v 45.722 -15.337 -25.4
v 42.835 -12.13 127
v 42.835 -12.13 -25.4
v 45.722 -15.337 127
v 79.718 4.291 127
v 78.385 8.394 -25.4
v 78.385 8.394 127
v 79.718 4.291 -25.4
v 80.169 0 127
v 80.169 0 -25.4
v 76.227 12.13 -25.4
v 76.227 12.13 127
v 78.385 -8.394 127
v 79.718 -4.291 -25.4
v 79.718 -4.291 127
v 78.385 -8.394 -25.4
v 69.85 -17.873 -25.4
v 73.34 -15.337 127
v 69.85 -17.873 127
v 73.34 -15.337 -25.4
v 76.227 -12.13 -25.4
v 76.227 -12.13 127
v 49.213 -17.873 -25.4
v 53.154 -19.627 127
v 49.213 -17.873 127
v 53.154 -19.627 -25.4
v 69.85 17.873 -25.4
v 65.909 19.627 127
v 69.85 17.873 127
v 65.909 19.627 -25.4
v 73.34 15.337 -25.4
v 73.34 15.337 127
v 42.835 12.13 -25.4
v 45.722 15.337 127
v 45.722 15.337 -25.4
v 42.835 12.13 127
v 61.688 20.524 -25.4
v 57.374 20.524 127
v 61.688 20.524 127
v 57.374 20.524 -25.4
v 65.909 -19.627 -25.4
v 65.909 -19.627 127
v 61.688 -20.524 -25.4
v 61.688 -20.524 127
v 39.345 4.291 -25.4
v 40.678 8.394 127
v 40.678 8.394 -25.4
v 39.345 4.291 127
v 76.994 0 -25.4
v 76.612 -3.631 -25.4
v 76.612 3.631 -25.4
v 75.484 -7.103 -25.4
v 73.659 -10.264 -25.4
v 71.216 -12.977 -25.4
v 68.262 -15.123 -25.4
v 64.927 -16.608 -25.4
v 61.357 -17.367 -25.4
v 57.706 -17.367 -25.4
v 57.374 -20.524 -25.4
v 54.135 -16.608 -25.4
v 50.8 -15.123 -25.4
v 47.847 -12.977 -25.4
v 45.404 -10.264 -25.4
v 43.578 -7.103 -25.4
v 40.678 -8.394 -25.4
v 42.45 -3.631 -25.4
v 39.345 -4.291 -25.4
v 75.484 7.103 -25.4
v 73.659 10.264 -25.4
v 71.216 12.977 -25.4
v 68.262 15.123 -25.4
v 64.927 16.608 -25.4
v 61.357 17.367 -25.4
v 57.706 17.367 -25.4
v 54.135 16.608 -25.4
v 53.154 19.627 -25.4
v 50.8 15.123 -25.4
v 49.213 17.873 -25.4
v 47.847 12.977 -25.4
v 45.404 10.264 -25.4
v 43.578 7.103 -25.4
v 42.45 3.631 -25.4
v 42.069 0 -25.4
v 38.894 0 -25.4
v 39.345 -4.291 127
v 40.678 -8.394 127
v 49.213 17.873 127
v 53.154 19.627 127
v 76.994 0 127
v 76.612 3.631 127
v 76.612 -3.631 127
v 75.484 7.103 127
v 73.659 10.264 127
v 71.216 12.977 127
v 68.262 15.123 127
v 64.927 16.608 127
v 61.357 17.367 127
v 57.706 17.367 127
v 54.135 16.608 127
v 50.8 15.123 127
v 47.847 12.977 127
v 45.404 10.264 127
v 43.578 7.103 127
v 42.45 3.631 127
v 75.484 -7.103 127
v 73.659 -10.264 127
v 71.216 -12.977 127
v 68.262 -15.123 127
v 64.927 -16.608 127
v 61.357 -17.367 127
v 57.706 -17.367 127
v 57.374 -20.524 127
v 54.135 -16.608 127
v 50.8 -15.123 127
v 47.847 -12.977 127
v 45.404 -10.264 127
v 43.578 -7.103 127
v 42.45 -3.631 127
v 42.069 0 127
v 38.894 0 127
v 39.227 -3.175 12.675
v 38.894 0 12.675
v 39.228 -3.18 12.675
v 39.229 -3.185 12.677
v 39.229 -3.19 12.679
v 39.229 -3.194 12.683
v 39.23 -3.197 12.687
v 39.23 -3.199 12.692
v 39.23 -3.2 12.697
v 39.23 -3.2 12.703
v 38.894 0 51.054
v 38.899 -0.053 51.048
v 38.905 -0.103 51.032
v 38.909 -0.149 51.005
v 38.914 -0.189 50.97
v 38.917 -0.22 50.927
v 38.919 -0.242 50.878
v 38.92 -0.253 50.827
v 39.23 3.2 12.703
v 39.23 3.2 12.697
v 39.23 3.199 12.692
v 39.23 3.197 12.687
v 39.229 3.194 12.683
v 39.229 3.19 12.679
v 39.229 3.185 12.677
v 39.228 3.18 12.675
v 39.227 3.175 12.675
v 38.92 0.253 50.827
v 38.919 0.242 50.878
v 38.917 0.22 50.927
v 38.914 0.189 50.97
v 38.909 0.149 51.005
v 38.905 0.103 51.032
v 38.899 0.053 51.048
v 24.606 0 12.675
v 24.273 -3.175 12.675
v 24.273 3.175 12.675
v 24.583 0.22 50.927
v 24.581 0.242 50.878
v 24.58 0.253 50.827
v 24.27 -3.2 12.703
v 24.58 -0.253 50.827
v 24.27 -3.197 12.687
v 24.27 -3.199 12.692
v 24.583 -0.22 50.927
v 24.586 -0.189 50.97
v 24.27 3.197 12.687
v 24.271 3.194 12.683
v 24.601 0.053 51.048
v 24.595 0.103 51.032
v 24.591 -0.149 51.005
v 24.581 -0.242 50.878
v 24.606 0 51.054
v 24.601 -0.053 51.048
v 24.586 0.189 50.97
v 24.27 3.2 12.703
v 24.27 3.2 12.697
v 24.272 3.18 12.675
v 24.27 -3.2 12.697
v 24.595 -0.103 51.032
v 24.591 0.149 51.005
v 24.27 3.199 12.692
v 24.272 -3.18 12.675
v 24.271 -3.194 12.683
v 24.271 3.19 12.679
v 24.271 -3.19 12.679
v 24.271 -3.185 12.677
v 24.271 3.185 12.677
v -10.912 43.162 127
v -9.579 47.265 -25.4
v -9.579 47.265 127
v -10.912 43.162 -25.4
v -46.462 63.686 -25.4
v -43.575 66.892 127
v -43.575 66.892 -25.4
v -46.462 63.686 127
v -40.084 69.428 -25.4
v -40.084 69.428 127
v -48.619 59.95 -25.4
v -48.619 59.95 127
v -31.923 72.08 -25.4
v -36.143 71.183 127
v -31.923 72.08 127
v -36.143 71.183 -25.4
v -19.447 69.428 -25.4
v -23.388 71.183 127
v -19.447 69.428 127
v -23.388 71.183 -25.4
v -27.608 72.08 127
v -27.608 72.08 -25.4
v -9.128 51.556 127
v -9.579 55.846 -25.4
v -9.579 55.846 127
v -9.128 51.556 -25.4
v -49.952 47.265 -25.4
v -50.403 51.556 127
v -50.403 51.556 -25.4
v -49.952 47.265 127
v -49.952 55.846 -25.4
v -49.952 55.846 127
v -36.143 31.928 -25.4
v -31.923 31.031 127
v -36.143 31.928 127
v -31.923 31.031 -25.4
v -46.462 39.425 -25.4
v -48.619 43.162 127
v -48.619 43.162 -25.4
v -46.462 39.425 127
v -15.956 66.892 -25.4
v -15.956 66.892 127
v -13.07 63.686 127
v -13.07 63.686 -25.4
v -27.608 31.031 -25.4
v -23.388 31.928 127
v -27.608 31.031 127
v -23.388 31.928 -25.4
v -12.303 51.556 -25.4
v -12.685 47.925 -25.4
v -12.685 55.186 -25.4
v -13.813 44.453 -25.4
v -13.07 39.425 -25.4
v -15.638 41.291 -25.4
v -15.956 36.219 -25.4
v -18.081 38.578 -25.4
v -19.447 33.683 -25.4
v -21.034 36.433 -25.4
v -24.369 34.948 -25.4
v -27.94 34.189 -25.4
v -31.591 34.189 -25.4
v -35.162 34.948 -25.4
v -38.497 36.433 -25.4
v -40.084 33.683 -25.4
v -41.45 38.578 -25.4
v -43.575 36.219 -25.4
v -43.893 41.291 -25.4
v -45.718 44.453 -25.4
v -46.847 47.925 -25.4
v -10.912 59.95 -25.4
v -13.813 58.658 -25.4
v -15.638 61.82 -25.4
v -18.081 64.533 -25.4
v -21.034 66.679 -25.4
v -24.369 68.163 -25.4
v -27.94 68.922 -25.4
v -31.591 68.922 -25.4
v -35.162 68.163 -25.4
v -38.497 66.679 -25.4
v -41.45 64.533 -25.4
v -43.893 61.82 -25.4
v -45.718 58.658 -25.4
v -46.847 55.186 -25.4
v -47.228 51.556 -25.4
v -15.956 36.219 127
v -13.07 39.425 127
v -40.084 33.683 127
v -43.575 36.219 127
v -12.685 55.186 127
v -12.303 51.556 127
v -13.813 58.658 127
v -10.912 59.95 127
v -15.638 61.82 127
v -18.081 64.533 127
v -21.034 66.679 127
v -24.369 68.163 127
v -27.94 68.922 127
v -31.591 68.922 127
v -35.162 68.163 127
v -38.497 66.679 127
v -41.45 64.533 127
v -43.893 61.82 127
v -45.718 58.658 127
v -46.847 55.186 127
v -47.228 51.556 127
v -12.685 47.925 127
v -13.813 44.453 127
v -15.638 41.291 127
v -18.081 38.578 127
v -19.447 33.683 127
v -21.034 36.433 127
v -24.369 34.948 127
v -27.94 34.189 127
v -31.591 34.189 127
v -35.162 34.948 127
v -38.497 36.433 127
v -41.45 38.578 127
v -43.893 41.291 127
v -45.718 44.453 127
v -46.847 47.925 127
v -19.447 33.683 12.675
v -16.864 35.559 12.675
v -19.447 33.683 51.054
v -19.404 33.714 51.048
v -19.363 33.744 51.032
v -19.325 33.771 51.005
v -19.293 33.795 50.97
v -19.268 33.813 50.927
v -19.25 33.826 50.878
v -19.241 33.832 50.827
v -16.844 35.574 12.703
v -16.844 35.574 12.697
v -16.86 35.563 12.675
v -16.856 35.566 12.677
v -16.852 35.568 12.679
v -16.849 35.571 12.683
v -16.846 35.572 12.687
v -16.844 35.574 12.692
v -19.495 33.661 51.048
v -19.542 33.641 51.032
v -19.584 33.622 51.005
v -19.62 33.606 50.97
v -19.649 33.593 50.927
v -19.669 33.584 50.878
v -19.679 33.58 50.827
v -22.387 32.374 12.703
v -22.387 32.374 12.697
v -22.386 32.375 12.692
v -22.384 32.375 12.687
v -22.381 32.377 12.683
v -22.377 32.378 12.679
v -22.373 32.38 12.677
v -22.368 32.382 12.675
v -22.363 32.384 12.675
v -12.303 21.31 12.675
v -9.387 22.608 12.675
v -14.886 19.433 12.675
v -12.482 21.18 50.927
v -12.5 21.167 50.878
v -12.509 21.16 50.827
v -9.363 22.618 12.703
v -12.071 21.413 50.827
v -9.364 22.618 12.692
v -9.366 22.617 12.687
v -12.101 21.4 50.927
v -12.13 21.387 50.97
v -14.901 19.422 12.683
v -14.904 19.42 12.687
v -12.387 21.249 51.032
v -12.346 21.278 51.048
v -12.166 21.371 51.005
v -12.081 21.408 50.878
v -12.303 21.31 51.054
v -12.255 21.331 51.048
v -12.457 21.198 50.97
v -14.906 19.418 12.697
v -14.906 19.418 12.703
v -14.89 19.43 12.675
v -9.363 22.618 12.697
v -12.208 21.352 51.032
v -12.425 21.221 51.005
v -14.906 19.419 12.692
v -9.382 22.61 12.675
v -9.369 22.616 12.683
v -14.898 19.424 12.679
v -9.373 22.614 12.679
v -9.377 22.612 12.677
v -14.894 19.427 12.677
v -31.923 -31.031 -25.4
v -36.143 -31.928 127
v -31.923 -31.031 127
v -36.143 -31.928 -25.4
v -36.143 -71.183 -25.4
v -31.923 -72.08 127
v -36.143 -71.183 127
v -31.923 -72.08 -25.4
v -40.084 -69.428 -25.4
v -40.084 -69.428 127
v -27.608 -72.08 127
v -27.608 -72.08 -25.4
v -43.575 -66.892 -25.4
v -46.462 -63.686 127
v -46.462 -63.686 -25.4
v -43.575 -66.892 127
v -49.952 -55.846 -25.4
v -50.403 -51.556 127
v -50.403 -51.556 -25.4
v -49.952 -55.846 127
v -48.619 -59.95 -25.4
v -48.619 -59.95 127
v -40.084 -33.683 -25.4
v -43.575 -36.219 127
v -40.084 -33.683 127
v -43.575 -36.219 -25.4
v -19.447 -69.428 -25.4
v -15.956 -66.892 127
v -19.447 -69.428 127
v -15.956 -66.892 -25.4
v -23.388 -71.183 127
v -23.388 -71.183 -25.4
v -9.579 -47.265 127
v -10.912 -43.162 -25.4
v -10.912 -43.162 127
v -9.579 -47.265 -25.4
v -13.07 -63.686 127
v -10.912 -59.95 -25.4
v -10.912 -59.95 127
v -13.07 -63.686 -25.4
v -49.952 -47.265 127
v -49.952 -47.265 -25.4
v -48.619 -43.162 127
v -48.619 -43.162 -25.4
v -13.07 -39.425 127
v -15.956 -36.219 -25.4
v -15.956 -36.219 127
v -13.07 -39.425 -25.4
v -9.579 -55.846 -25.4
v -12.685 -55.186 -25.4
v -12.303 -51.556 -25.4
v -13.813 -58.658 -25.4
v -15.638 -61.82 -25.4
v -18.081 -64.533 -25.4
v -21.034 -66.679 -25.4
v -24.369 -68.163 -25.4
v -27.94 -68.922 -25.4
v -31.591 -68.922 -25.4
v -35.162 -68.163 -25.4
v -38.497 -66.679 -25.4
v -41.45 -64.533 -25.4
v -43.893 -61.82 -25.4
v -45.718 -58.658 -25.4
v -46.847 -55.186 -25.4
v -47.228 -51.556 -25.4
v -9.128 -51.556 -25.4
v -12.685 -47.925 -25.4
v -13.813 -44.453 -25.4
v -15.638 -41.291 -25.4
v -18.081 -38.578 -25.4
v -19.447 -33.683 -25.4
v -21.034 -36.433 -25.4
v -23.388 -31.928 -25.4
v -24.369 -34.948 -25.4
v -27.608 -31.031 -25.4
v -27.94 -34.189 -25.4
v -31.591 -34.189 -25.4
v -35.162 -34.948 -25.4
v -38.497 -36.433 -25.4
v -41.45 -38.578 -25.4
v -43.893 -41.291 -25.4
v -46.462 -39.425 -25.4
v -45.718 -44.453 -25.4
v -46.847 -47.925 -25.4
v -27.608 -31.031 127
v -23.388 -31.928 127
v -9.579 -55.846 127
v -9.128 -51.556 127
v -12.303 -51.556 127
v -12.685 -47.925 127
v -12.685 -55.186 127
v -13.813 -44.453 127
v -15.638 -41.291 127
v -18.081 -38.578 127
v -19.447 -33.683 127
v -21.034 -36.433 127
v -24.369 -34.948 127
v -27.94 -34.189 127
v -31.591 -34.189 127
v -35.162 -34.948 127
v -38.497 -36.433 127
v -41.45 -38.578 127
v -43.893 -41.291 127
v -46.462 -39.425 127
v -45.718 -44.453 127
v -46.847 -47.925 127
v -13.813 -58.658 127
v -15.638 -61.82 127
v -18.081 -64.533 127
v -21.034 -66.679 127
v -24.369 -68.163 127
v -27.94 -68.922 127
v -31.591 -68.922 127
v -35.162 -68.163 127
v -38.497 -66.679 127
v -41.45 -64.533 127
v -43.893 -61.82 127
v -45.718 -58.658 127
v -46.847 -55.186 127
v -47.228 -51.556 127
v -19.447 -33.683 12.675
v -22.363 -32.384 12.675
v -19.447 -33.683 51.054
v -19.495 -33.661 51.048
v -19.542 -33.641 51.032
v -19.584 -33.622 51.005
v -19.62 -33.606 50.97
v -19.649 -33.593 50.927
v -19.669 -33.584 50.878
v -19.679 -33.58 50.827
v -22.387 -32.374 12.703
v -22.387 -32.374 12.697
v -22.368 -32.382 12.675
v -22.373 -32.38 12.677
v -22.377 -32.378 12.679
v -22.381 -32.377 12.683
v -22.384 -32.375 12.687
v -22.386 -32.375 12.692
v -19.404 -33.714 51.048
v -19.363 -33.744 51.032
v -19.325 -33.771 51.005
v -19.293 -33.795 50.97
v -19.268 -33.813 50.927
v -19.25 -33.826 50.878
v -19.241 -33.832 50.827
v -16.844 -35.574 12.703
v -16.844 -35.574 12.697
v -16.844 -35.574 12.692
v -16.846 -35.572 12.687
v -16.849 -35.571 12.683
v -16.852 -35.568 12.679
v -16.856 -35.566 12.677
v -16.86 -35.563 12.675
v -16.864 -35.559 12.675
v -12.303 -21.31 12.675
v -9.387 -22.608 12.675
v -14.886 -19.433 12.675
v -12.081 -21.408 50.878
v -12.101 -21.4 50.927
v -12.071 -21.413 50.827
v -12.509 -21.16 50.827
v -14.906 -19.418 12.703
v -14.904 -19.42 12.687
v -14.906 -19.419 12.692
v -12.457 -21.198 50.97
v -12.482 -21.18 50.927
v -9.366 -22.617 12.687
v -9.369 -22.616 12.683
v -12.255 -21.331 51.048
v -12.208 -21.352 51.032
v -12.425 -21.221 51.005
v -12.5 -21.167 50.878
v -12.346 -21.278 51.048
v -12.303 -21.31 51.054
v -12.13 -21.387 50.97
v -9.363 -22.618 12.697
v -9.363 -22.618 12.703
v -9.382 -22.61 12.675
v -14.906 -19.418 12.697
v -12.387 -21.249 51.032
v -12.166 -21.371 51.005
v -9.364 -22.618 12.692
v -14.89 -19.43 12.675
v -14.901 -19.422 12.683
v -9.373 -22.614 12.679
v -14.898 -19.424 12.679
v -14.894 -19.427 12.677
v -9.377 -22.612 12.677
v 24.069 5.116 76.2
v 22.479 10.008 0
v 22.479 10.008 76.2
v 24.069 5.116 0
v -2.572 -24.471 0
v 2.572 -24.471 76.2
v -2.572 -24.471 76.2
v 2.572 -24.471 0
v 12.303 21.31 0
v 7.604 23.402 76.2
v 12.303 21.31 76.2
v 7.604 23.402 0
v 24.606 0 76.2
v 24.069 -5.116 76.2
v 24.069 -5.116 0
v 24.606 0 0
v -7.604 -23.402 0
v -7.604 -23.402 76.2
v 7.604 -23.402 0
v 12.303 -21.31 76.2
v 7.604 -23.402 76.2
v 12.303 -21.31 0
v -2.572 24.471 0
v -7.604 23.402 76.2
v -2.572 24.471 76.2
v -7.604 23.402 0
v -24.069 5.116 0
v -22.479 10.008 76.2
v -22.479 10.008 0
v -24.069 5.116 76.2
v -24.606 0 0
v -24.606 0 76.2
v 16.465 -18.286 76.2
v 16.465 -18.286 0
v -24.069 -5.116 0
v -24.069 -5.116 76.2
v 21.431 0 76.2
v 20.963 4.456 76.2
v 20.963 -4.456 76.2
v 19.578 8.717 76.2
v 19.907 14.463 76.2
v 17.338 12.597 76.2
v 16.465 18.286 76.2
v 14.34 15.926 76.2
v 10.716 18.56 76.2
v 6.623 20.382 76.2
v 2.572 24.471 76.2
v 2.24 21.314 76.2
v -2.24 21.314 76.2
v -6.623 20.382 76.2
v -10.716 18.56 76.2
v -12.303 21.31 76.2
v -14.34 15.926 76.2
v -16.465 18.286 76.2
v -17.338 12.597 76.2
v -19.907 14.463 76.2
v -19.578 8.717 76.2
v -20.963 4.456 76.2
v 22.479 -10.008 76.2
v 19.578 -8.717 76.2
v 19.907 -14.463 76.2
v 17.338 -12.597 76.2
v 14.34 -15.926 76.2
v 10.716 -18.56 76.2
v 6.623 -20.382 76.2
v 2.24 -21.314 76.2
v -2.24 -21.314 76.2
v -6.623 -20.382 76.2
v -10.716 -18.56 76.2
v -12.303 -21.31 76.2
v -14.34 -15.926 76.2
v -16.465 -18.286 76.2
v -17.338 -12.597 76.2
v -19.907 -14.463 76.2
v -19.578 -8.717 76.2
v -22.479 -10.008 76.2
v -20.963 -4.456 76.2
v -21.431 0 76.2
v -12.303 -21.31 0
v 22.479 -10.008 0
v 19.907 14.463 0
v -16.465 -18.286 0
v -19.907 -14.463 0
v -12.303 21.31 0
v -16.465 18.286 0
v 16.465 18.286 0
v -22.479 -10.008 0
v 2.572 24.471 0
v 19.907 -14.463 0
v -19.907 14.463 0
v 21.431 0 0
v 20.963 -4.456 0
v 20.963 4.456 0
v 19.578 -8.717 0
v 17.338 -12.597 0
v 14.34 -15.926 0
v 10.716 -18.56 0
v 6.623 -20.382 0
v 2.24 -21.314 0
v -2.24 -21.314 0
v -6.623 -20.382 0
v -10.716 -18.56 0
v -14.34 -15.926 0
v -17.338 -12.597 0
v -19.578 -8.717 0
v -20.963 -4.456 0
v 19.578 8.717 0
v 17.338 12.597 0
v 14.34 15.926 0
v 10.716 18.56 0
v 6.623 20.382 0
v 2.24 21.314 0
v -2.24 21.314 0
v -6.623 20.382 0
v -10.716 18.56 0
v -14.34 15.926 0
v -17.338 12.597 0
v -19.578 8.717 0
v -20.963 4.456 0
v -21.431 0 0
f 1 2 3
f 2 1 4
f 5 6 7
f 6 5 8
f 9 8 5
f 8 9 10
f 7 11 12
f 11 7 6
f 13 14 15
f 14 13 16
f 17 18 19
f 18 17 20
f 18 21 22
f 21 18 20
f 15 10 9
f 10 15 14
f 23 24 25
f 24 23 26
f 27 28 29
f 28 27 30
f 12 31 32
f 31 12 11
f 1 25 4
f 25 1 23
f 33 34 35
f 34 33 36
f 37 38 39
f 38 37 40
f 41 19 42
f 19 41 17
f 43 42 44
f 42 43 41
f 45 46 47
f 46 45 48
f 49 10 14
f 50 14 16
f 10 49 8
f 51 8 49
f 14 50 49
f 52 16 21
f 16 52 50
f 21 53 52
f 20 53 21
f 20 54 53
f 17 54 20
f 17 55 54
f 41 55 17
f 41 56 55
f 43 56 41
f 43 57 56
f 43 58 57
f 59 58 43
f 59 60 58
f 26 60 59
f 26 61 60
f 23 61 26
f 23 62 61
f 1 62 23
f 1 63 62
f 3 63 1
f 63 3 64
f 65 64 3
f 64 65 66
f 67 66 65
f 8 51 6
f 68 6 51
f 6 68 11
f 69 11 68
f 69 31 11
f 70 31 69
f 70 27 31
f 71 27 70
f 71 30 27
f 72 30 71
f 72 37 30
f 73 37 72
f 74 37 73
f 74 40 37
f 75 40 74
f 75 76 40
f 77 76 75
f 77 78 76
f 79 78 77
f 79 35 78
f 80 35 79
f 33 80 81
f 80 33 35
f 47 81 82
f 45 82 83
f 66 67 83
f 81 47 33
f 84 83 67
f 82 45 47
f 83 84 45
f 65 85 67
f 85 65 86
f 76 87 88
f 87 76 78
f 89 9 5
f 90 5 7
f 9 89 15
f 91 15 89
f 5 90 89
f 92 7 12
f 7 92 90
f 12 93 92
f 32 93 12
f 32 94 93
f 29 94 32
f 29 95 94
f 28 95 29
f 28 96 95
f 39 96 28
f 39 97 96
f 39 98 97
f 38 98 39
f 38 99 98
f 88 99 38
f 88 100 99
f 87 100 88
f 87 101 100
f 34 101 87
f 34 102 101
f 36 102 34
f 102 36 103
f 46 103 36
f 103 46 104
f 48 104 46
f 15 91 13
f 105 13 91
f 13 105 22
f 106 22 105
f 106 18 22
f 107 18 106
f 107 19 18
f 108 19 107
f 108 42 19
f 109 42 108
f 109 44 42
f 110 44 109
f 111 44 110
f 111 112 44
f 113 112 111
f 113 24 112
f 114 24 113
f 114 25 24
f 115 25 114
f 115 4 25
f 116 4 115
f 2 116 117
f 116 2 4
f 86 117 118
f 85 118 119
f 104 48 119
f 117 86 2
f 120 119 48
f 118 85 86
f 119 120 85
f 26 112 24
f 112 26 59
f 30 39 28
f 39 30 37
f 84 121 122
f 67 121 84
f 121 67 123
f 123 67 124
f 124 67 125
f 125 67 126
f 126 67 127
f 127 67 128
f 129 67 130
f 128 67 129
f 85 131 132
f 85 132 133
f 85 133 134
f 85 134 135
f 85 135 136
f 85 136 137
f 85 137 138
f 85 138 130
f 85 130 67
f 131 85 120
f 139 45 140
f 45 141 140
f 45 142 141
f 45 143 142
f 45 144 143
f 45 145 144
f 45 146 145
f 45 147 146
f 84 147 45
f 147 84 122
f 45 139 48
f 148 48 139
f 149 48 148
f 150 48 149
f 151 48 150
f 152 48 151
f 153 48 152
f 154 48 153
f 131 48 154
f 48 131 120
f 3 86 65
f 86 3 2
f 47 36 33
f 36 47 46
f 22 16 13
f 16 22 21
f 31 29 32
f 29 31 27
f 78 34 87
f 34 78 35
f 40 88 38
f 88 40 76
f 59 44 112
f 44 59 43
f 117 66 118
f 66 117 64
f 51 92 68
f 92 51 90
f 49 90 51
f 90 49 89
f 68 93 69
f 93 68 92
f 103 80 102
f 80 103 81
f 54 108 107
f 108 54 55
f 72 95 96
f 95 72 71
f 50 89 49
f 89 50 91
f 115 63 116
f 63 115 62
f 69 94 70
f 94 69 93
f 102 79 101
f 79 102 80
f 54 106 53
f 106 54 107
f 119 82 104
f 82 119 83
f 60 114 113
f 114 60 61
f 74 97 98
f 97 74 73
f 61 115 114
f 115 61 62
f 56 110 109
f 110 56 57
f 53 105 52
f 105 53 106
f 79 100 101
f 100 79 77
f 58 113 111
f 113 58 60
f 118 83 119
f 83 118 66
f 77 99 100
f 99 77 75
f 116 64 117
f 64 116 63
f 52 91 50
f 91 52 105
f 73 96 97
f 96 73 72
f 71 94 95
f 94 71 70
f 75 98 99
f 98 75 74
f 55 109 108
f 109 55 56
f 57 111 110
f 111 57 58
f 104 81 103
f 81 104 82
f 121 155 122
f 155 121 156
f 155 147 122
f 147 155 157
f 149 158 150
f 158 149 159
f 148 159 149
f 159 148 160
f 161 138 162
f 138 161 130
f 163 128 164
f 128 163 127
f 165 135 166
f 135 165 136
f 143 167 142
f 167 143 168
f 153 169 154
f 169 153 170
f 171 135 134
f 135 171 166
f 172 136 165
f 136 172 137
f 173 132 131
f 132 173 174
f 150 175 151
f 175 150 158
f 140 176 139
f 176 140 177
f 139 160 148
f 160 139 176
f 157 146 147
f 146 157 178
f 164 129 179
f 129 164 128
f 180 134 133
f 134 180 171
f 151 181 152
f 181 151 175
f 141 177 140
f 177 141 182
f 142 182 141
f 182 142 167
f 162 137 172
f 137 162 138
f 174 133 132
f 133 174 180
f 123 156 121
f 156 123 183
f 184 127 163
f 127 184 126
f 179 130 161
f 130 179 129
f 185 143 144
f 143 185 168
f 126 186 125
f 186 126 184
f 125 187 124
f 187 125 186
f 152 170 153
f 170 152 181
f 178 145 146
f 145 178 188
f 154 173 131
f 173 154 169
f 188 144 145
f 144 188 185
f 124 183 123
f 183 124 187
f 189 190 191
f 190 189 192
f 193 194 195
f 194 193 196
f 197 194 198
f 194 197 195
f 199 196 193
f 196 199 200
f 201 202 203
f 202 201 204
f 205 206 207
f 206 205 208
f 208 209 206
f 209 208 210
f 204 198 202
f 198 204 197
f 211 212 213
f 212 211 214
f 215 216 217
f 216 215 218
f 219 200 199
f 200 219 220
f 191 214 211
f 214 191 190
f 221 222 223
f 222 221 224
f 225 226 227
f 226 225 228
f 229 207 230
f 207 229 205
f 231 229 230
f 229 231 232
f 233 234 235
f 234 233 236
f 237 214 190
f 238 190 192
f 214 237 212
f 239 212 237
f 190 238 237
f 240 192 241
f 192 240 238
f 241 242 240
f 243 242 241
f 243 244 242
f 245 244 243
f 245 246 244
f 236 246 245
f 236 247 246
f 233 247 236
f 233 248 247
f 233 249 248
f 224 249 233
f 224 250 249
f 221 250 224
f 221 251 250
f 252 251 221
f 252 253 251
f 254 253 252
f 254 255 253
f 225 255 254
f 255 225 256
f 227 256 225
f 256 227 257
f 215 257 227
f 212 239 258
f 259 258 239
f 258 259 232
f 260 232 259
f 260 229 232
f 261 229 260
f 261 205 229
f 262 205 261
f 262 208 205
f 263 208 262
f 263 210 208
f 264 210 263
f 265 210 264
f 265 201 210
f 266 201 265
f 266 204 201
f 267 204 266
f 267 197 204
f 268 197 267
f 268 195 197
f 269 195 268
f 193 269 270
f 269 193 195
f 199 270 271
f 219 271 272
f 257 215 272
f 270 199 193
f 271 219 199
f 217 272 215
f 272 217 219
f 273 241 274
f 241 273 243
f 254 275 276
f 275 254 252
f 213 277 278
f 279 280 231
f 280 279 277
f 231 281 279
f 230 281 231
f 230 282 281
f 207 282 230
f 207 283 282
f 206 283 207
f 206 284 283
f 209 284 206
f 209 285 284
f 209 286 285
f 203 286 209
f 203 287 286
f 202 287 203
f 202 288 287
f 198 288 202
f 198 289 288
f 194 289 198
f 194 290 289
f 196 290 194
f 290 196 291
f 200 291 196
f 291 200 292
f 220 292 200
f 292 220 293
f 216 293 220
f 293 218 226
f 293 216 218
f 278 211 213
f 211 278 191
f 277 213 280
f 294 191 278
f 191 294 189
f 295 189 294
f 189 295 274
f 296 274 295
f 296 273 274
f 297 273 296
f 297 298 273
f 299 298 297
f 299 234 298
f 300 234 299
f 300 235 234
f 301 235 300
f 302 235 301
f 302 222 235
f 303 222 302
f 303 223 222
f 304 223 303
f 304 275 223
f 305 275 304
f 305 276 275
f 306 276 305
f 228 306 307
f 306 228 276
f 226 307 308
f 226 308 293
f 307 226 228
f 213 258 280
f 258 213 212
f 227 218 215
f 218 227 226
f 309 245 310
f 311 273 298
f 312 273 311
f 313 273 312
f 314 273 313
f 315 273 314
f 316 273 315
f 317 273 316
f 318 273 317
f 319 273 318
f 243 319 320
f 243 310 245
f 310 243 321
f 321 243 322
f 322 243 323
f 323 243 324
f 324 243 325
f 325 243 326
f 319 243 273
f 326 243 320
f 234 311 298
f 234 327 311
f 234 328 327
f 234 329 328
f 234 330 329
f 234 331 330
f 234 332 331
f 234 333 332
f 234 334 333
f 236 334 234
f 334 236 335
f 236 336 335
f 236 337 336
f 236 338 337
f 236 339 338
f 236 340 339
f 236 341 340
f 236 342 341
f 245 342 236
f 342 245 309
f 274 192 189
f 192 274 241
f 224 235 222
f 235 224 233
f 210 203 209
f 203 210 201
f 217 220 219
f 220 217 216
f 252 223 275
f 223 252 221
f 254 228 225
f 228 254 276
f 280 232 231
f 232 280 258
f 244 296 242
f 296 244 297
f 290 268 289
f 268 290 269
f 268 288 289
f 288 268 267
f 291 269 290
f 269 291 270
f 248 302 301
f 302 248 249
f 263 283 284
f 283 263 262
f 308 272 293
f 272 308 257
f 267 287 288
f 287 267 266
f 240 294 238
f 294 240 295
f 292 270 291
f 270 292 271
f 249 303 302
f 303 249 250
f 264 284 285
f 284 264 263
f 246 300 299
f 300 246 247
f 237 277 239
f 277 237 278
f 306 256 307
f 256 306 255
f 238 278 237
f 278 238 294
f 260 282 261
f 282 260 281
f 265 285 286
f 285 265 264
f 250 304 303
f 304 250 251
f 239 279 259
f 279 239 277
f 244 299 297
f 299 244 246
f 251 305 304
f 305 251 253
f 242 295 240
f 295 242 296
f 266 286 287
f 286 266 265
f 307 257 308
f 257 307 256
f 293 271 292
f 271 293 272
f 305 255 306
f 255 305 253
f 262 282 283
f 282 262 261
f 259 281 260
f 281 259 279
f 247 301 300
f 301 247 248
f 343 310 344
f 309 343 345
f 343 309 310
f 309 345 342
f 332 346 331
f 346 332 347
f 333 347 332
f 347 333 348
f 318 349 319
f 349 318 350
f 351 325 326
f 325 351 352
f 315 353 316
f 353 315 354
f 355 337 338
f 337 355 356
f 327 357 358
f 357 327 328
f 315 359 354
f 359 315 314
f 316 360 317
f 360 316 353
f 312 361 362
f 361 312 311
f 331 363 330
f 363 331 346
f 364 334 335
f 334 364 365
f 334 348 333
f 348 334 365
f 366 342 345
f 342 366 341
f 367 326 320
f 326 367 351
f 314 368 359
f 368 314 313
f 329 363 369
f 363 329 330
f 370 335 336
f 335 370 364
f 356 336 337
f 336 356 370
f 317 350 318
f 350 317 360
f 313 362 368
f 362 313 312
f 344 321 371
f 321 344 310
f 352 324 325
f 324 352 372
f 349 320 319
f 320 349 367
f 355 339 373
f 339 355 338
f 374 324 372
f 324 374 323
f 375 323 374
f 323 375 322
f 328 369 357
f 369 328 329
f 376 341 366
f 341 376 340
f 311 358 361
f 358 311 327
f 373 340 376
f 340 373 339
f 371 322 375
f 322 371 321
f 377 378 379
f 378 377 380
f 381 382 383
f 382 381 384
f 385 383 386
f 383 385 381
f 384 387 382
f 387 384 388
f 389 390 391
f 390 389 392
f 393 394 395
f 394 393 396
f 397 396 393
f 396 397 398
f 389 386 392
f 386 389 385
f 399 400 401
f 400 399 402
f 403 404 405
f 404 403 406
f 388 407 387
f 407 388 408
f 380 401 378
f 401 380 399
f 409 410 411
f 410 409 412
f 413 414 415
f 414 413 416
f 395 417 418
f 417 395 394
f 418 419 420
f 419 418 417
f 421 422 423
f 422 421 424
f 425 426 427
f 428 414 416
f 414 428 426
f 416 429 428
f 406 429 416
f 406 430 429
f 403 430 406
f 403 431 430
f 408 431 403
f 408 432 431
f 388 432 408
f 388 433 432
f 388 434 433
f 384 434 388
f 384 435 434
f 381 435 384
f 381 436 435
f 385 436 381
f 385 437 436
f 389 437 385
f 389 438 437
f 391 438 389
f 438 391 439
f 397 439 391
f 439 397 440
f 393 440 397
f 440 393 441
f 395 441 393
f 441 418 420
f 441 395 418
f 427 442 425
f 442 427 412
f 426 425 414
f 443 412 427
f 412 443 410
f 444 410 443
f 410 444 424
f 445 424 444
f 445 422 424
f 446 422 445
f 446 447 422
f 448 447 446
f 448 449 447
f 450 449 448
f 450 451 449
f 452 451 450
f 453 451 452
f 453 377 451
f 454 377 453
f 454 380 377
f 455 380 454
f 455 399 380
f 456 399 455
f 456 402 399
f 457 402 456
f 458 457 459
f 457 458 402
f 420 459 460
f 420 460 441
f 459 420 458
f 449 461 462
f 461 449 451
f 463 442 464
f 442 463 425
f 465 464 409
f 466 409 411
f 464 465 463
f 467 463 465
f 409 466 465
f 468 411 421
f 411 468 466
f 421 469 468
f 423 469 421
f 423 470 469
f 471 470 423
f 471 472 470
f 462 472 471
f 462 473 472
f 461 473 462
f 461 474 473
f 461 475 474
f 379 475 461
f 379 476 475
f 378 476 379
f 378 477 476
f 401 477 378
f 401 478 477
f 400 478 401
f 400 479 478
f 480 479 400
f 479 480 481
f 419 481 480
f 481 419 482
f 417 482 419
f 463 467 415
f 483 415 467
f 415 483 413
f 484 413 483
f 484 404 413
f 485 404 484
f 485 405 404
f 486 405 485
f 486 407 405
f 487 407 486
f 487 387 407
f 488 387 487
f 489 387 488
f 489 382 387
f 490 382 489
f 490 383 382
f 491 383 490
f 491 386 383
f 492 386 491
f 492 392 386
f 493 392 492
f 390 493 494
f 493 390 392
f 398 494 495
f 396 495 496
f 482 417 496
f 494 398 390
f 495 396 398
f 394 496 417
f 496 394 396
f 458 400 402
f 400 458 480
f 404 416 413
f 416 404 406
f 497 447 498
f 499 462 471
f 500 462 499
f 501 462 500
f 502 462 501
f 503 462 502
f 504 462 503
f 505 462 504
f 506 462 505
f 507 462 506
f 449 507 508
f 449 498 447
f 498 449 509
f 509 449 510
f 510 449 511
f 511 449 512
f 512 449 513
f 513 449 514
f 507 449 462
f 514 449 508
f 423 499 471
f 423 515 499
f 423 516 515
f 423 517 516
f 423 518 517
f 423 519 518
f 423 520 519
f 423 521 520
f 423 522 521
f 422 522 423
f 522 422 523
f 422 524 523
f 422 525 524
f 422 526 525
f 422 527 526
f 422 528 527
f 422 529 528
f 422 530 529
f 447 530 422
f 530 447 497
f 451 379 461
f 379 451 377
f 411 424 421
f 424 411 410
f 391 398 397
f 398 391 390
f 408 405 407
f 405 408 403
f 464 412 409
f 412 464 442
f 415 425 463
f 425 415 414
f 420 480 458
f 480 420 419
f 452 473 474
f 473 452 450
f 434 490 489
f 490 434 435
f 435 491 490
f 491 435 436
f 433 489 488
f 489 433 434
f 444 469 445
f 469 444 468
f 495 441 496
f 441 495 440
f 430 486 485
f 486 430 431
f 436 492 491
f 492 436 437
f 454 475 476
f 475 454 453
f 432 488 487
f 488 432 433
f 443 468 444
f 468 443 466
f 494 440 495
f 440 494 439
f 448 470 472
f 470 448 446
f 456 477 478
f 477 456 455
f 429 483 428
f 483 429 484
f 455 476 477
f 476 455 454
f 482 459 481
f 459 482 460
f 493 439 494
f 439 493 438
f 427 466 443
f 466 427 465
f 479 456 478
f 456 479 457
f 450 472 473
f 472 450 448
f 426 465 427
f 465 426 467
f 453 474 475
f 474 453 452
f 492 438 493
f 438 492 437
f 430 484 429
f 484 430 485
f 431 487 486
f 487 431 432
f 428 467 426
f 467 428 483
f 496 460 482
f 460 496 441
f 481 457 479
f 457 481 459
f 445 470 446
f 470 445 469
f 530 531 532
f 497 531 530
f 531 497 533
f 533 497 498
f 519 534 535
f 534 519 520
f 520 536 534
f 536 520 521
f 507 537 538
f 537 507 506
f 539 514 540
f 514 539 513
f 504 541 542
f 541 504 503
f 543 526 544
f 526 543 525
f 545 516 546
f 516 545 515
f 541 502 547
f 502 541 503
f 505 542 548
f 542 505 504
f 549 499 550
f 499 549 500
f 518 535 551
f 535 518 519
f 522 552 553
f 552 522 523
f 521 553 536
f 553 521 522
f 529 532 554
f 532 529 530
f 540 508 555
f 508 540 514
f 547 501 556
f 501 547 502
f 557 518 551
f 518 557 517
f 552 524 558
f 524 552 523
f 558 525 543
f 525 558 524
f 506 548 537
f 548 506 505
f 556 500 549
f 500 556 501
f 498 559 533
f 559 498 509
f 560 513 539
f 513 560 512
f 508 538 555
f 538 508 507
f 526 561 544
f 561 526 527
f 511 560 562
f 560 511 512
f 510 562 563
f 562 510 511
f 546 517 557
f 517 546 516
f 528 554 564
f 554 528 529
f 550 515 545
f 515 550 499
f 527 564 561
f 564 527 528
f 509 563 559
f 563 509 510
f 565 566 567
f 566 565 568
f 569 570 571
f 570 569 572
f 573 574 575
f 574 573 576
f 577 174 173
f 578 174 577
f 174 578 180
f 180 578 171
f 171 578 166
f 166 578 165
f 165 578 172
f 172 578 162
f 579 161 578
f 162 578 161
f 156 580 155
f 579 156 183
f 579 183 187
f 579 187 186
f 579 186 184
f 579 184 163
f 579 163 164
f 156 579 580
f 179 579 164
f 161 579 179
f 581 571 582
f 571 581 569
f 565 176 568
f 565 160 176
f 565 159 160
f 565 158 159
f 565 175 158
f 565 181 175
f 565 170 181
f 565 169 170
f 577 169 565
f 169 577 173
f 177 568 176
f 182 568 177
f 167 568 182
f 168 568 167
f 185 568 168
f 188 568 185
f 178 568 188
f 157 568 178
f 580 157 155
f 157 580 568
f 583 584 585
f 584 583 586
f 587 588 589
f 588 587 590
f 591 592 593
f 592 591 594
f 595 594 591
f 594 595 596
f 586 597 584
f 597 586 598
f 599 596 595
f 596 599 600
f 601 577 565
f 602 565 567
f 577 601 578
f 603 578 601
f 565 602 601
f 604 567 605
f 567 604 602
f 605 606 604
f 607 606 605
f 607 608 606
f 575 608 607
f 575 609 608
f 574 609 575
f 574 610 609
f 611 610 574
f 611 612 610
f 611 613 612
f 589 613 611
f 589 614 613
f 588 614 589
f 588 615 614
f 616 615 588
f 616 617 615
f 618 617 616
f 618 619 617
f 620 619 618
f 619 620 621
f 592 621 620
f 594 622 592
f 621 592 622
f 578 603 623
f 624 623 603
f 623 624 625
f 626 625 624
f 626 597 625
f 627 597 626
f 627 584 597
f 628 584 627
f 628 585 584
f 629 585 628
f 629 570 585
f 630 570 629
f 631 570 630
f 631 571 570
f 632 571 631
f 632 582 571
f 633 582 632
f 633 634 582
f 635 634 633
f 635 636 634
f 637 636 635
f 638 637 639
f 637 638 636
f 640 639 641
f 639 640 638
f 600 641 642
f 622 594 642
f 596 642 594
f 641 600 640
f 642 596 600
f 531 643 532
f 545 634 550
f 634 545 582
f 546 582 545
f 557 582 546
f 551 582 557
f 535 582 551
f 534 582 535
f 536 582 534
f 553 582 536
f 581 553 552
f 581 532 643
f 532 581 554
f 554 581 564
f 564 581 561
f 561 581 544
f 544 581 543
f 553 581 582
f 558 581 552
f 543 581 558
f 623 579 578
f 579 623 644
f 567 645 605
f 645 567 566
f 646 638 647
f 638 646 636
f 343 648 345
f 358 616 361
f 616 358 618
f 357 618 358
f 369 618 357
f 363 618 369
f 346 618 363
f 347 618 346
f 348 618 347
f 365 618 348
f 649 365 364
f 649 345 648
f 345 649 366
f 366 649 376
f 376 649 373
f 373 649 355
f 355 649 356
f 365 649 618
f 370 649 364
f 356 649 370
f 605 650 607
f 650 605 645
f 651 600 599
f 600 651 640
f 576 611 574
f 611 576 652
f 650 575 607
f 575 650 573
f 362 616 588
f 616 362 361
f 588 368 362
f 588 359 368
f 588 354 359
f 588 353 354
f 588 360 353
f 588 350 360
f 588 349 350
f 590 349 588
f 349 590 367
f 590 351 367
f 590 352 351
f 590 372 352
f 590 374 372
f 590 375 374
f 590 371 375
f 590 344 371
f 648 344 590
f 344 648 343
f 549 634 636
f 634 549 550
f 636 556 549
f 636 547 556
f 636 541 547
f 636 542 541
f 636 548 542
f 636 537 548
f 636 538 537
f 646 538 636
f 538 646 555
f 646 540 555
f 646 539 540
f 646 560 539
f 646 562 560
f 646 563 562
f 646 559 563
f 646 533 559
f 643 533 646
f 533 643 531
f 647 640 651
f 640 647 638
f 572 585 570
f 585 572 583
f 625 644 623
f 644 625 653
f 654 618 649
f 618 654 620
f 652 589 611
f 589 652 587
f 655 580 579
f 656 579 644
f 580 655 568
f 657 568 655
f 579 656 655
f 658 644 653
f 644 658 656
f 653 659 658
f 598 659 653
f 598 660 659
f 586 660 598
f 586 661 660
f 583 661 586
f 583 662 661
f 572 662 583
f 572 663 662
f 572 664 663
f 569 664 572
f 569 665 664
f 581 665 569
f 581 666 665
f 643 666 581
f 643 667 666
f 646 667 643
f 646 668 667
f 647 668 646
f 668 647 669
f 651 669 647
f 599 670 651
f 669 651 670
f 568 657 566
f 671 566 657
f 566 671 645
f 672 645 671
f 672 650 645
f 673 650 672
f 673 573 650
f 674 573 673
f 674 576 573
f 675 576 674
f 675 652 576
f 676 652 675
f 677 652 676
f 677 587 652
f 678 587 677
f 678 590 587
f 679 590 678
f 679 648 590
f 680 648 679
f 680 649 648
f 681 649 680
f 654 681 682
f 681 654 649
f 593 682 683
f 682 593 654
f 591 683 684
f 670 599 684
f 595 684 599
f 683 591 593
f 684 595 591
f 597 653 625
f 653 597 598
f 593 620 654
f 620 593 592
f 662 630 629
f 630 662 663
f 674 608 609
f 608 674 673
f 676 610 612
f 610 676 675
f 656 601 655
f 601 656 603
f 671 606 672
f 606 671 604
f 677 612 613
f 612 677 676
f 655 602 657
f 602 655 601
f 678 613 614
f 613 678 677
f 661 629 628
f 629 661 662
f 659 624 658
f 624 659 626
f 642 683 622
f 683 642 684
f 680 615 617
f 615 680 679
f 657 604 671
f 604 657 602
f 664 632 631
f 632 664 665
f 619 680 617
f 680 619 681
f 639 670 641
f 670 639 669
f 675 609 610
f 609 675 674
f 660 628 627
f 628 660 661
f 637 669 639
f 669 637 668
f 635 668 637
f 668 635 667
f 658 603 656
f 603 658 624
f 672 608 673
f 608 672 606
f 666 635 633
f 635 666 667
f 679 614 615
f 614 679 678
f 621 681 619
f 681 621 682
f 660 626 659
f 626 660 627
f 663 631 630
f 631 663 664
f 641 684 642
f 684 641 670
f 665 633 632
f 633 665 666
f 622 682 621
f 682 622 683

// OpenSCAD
// preview[view:south east, tilt: top diagonal]

//What units are you measuring in?
units = "Inches"; //[Inches, Millimeters]

//Wall thickness for the engine brackets
wall_t = .125;

//Resolution
$fn = 30;

/* [Secondary Engines] */

//Secondary engine diameter
se_d = 1.375;
//Secondary engine mount height
se_h = 6;
//How many secondary engines are there?
se_n = 3;
//distance between the bottom of the main engine to the bottom of the second engine
se_me_diff = 1;

/* [Main Engine] */

//Main engine diameter
me_d = 1.6875;
// main engine mount height
me_h = 3;
//distance between bottom of the spacer and the bottom of the main engine
me_s_diff = .5;

/* [Spacer] */

//Spacer length
s_l = .5625;
//Spacer thickness
s_t = .25;
//Spacer height
s_h = 1.5;

/* [Hidden] */

//Makes the spacer arms overlap
overlap_amount = wall_t*2;

engine_spacer_render();

//Builds the mount to hold the secondary rocket engines
module secondary_engine_mount(){
  difference(){
    cylinder(r = se_d/2+wall_t, h = se_h);
    cylinder(r = se_d/2, h = se_h);
  }
}

//Builds the mount to hold the main engine
module main_engine_mount(){
  difference(){
    cylinder(r = me_d/2+wall_t, h = me_h);
    cylinder(r = me_d/2, h = me_h);
  }
}

//Builds the spacer that connects the secondary engines to the main engine
module spacer(){
  _r = .001;
  difference(){
    translate([me_d/2,0,0]) rotate([0,90,0]) hull(){
      for(j = [-1:2:1])
        translate([0,s_t/2*j,0])
          cylinder(r = _r, h = s_l+overlap_amount);
        translate([-s_h,0,0])
          cylinder(r = .01, h = s_l+overlap_amount);
    }
    union(){
      cylinder(r = me_d/2, h = s_h*2.5, center = true);
      translate([s_l+(me_d/2+wall_t)+(se_d/2+wall_t),0,0])
        cylinder(r = se_d/2, h = s_h*2.5, center = true);
    }
  }
}
//Connects all of the different parts together
module engine_spacer(){
  for(i = [0:360/se_n:360])
    rotate(i){
      translate([s_l+(me_d/2+wall_t)+(se_d/2+wall_t), 0, -se_me_diff])
        secondary_engine_mount();
      translate([0,0,me_s_diff])
        spacer();
    }
  main_engine_mount();
}
//converts the model to inches if units = "Inches"
module engine_spacer_render(){
  if(units == "Inches")
   scale(25.4) engine_spacer();
  else if (units == "Millimeters")
    engine_spacer();
}
